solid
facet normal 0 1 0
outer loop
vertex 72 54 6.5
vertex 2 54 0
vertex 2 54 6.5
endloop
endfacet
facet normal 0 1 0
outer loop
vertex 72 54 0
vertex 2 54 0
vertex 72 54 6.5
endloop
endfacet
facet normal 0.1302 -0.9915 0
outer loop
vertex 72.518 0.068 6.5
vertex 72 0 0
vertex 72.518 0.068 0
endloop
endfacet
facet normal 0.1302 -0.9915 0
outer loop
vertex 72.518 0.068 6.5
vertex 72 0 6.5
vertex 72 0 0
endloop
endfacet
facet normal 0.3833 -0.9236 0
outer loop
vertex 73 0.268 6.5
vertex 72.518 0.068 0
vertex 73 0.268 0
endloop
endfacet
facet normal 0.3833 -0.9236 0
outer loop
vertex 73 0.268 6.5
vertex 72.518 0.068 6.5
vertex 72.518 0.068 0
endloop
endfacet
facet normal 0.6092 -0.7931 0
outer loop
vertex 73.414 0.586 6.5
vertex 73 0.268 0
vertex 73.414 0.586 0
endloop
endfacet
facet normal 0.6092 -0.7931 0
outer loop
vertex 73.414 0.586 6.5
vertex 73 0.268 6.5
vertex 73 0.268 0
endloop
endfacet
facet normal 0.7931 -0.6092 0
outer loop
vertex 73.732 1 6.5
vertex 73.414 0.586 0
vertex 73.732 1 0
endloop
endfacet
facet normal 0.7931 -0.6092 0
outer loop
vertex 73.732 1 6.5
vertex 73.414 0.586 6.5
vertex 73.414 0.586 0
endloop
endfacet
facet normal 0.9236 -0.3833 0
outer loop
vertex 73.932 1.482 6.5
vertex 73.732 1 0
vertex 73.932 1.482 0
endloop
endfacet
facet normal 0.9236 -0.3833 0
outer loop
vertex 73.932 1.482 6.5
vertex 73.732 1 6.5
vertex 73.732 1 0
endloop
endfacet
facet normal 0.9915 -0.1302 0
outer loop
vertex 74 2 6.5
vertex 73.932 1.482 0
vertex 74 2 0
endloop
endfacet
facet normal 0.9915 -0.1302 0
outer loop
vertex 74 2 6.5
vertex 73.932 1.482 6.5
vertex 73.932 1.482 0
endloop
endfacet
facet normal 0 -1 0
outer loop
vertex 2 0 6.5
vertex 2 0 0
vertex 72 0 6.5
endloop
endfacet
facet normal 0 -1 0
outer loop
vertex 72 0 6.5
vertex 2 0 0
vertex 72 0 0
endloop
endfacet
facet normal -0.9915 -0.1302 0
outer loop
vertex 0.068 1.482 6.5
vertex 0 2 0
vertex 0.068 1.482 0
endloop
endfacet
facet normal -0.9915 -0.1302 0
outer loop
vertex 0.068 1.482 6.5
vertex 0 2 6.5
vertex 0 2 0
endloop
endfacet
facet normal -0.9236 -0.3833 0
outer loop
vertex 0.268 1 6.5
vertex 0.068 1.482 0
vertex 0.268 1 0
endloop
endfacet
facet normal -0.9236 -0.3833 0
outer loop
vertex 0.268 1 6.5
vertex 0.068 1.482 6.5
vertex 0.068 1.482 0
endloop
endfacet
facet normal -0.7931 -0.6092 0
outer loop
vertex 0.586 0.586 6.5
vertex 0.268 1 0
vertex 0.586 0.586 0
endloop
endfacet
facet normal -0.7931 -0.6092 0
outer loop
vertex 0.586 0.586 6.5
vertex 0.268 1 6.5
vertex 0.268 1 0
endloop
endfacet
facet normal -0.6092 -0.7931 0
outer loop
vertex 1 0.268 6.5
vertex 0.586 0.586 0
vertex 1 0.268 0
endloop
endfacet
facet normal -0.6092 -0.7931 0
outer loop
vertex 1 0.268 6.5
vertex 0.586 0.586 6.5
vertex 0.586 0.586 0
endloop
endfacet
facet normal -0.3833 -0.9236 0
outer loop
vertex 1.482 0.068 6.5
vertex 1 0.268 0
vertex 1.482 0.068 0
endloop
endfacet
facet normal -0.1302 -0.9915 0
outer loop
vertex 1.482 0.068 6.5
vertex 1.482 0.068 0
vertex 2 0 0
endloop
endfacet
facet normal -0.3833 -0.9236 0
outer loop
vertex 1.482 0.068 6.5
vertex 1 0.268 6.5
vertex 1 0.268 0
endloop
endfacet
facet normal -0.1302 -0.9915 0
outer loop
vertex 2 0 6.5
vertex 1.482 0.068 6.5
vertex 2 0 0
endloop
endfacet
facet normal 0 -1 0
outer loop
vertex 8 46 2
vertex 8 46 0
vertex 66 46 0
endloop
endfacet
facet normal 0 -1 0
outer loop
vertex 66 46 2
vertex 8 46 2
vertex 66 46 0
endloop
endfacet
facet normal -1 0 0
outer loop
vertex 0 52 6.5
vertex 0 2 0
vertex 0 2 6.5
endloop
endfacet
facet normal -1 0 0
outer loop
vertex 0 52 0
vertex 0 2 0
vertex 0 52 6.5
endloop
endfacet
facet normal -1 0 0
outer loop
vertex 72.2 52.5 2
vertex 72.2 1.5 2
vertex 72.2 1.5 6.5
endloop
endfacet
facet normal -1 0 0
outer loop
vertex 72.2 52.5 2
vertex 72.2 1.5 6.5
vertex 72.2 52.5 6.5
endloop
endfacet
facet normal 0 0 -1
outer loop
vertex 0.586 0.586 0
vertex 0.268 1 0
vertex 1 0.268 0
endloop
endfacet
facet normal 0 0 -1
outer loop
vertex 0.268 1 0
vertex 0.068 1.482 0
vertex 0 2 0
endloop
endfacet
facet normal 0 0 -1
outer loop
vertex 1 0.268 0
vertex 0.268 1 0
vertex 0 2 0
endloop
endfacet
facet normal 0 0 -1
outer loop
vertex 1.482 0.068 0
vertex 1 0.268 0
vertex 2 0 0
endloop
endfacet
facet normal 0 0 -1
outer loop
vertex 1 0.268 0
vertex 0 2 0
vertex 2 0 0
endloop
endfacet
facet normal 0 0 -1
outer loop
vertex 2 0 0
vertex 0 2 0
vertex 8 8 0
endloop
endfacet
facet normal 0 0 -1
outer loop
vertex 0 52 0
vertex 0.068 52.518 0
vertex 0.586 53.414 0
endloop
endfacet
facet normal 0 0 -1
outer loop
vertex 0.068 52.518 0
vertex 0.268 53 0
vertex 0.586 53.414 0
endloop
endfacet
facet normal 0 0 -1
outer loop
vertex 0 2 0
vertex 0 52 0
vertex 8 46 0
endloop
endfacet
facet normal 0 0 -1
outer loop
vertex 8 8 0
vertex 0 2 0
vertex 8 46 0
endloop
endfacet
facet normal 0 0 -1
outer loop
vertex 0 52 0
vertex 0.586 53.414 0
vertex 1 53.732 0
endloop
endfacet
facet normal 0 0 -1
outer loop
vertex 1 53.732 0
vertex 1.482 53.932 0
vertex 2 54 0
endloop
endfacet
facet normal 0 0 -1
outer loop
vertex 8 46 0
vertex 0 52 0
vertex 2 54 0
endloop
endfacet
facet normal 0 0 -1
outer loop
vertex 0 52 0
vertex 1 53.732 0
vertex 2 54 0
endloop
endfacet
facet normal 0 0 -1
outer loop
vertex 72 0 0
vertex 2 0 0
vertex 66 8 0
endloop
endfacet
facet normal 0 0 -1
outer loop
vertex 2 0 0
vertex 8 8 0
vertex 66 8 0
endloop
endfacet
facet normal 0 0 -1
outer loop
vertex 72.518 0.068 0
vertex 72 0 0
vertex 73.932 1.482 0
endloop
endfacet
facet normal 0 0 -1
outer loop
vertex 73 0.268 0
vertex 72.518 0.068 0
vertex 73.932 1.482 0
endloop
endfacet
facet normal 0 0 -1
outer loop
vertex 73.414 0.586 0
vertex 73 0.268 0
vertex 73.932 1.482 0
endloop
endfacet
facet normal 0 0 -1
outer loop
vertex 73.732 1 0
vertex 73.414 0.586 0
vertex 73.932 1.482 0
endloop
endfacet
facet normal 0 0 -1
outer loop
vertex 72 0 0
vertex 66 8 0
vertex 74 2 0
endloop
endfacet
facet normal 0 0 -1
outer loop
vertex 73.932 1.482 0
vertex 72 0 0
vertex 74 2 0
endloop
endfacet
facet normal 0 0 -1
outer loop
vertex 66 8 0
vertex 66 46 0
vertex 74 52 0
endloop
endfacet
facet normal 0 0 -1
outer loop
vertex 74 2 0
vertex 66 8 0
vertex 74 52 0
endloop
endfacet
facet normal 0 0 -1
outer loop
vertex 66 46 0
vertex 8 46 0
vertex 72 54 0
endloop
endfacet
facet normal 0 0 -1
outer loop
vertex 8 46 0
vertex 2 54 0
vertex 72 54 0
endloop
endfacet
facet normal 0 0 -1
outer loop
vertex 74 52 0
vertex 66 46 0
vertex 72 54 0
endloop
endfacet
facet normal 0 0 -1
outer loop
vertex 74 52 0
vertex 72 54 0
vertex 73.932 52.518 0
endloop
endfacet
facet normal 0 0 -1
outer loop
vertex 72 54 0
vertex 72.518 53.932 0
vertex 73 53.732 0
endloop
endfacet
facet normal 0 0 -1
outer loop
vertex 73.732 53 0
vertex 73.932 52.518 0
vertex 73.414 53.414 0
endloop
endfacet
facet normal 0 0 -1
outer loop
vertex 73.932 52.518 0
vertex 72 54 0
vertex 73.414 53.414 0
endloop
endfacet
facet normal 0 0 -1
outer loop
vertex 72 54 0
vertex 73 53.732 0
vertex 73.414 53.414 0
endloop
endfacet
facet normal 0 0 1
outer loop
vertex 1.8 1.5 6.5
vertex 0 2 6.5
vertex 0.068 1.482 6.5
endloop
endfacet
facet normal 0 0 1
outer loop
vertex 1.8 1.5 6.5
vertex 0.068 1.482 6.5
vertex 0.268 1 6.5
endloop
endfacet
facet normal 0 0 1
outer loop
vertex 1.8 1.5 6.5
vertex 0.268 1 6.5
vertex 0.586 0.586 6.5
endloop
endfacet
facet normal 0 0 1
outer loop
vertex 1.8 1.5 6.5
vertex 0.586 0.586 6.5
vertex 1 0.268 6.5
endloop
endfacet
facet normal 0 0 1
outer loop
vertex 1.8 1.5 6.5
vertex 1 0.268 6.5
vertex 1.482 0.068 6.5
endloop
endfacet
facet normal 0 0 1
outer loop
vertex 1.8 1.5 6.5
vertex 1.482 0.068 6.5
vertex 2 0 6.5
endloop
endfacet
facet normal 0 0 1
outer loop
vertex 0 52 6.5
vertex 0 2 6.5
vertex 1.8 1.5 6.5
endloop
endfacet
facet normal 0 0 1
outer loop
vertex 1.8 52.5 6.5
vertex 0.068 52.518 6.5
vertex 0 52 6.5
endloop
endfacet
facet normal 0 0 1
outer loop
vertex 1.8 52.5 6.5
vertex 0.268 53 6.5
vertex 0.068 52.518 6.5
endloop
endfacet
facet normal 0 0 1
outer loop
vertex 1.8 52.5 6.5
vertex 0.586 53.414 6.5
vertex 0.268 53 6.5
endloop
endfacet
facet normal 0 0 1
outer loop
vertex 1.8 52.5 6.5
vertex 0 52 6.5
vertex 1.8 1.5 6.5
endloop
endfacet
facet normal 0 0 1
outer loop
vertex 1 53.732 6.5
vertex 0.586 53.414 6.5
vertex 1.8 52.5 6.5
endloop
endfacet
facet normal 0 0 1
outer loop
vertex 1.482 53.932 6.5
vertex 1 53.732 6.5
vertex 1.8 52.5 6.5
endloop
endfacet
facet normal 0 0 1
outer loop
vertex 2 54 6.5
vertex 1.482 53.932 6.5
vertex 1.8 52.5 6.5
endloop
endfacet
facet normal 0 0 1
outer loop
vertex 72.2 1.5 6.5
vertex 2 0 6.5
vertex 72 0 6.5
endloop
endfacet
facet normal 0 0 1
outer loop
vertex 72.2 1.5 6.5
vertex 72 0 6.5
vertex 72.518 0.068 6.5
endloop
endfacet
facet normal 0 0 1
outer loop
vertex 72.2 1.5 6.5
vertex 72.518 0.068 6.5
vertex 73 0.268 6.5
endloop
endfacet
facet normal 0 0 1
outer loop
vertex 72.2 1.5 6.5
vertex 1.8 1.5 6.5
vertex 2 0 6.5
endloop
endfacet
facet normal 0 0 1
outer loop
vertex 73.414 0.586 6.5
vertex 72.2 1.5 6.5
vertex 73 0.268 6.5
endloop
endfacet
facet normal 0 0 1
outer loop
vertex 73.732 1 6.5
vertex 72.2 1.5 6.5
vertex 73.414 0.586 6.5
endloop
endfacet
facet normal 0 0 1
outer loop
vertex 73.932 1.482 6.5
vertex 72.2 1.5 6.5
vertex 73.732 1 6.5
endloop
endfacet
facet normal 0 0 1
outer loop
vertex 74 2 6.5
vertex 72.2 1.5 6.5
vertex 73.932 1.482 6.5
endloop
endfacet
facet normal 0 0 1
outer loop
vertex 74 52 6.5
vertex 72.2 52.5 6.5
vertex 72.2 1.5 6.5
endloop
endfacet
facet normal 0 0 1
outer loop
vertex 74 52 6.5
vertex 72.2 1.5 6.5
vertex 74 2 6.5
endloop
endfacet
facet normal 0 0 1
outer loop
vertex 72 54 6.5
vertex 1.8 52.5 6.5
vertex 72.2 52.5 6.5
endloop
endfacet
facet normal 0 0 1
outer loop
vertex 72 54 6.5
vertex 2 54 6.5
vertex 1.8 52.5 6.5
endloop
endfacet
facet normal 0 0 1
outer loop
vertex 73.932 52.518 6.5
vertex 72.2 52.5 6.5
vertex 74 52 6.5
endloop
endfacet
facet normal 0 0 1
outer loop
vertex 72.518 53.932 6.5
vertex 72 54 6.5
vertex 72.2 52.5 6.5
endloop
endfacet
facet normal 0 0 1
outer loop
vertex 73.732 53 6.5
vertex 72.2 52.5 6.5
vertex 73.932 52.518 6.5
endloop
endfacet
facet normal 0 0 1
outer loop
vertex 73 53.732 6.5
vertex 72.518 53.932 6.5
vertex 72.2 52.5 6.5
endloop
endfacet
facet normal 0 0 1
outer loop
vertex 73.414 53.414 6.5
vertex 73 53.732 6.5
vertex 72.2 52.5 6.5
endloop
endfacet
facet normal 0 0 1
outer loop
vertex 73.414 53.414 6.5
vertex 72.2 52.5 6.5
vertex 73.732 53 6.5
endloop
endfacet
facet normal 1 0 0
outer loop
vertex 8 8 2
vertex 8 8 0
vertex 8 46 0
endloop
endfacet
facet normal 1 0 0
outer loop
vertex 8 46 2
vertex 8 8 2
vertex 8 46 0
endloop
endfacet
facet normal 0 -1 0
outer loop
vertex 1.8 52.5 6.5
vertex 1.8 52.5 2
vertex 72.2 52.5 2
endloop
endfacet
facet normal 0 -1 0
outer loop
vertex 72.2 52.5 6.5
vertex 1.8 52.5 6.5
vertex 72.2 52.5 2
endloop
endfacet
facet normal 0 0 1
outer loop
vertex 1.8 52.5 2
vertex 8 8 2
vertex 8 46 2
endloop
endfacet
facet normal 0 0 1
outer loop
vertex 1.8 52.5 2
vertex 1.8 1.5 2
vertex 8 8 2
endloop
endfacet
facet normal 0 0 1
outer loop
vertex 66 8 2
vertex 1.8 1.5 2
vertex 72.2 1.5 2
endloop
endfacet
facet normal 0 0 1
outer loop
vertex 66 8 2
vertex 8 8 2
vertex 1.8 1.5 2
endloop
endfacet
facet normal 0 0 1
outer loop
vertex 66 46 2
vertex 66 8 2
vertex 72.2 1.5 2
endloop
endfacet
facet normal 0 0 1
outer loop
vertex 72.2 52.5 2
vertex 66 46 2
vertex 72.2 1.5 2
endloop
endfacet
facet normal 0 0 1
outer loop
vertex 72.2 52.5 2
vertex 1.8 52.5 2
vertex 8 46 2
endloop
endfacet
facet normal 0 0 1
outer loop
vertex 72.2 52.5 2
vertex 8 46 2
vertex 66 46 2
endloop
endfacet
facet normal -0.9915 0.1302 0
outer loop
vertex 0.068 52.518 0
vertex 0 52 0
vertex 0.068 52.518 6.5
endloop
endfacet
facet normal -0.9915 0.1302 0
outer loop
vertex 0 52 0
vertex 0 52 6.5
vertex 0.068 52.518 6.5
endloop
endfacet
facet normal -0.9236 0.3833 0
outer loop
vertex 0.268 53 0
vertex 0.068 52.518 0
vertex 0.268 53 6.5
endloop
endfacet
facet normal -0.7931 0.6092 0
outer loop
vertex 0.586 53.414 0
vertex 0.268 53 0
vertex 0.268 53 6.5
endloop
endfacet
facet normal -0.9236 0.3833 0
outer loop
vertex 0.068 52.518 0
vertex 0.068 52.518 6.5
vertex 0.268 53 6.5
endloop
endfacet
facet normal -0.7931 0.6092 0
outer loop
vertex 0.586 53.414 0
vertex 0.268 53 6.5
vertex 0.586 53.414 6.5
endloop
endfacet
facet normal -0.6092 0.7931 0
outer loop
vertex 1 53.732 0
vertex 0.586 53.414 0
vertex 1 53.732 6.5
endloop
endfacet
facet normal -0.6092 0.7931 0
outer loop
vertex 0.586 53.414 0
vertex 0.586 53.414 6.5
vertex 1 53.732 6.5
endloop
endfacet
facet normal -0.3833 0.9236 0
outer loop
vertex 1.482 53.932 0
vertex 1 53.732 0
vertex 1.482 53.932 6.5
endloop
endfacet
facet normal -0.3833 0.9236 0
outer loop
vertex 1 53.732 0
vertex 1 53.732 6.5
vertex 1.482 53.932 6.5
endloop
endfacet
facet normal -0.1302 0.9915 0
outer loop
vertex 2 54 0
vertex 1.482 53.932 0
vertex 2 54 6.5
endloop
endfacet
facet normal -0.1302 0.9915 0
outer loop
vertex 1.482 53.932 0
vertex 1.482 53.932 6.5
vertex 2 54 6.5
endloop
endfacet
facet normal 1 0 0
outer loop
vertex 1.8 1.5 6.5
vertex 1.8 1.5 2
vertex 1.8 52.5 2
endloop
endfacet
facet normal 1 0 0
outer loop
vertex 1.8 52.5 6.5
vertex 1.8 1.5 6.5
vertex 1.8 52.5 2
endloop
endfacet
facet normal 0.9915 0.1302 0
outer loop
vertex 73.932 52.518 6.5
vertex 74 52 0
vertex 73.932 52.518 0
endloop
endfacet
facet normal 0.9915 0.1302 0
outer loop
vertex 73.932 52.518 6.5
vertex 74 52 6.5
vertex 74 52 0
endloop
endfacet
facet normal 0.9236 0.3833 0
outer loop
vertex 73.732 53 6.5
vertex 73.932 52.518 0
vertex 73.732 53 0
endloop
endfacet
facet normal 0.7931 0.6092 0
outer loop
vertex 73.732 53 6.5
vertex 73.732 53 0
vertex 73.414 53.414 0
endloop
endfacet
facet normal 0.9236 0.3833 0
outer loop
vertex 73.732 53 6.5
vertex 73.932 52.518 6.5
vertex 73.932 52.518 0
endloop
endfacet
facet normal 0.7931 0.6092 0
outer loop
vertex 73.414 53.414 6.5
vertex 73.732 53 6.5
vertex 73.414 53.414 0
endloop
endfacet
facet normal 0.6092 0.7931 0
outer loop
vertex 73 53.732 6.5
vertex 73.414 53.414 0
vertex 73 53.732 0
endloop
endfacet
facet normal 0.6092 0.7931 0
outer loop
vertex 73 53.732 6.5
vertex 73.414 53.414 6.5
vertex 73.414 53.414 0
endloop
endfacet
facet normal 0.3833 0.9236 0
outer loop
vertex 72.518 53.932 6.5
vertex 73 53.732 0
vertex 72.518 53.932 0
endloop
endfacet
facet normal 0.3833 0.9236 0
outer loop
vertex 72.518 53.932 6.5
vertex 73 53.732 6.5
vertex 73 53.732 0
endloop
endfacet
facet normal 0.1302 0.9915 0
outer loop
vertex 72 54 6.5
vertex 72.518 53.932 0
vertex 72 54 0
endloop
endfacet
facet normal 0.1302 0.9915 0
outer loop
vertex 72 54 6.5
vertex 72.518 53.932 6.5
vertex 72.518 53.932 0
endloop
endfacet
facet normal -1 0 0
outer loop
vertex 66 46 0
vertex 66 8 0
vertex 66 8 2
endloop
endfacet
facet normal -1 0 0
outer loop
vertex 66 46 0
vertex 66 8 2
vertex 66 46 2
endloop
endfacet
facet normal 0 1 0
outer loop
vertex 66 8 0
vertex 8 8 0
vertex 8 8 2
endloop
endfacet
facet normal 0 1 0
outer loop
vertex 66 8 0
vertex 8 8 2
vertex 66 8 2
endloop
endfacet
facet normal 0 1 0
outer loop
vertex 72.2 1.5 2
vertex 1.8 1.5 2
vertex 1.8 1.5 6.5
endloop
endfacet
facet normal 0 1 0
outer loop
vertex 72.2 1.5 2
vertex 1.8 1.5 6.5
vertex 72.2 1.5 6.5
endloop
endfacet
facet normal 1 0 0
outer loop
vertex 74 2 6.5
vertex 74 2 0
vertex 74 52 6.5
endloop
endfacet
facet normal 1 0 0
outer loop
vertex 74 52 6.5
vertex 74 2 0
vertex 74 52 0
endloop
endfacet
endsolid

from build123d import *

# Parameters (mm, degrees)
BOX_W        = 70.4
BOX_H        = 51
BOX_DEPTH    = 6.5
BOX003_W     = 58
BOX003_H     = 38
BOX003_DEPTH = 10
BOX001_W     = 74
BOX001_H     = 54
BOX001_DEPTH = 6.5
FILLET002_R  = 2


with BuildPart() as internal_cube:
    # Box → Box (new body)
    with BuildSketch(Plane(origin=(1.8, 1.5, 2), x_dir=(1, 0, 0), z_dir=(0, 0, 1))):
        with Locations((35.2, 25.5)):
            Rectangle(BOX_W, BOX_H)
    extrude(amount=BOX_DEPTH)


with BuildPart() as extraction_fusion:
    # Box003 → Box003 (new body)
    with BuildSketch(Plane(origin=(8, 8, -5), x_dir=(1, 0, 0), z_dir=(0, 0, 1))):
        with Locations((29, 19)):
            Rectangle(BOX003_W, BOX003_H)
    extrude(amount=BOX003_DEPTH)

    # Fusion: union internal cube
    add(internal_cube.part)


with BuildPart() as main_cube_cut:
    # Box001 → Box001 (new body)
    with BuildSketch(Plane.XY):
        with Locations((37, 27)):
            Rectangle(BOX001_W, BOX001_H)
    extrude(amount=BOX001_DEPTH)

    # Fillet002
    fillet002_edges = [main_cube_cut.edges().sort_by_distance(p)[0] for p in [
        (0, 0, 3.25),
        (0, 54, 3.25),
        (74, 0, 3.25),
        (74, 54, 3.25),
    ]]
    fillet(fillet002_edges, radius=FILLET002_R)

    # Cut: cut extraction fusion
    add(extraction_fusion.part, mode=Mode.SUBTRACT)


solid = main_cube_cut.part
